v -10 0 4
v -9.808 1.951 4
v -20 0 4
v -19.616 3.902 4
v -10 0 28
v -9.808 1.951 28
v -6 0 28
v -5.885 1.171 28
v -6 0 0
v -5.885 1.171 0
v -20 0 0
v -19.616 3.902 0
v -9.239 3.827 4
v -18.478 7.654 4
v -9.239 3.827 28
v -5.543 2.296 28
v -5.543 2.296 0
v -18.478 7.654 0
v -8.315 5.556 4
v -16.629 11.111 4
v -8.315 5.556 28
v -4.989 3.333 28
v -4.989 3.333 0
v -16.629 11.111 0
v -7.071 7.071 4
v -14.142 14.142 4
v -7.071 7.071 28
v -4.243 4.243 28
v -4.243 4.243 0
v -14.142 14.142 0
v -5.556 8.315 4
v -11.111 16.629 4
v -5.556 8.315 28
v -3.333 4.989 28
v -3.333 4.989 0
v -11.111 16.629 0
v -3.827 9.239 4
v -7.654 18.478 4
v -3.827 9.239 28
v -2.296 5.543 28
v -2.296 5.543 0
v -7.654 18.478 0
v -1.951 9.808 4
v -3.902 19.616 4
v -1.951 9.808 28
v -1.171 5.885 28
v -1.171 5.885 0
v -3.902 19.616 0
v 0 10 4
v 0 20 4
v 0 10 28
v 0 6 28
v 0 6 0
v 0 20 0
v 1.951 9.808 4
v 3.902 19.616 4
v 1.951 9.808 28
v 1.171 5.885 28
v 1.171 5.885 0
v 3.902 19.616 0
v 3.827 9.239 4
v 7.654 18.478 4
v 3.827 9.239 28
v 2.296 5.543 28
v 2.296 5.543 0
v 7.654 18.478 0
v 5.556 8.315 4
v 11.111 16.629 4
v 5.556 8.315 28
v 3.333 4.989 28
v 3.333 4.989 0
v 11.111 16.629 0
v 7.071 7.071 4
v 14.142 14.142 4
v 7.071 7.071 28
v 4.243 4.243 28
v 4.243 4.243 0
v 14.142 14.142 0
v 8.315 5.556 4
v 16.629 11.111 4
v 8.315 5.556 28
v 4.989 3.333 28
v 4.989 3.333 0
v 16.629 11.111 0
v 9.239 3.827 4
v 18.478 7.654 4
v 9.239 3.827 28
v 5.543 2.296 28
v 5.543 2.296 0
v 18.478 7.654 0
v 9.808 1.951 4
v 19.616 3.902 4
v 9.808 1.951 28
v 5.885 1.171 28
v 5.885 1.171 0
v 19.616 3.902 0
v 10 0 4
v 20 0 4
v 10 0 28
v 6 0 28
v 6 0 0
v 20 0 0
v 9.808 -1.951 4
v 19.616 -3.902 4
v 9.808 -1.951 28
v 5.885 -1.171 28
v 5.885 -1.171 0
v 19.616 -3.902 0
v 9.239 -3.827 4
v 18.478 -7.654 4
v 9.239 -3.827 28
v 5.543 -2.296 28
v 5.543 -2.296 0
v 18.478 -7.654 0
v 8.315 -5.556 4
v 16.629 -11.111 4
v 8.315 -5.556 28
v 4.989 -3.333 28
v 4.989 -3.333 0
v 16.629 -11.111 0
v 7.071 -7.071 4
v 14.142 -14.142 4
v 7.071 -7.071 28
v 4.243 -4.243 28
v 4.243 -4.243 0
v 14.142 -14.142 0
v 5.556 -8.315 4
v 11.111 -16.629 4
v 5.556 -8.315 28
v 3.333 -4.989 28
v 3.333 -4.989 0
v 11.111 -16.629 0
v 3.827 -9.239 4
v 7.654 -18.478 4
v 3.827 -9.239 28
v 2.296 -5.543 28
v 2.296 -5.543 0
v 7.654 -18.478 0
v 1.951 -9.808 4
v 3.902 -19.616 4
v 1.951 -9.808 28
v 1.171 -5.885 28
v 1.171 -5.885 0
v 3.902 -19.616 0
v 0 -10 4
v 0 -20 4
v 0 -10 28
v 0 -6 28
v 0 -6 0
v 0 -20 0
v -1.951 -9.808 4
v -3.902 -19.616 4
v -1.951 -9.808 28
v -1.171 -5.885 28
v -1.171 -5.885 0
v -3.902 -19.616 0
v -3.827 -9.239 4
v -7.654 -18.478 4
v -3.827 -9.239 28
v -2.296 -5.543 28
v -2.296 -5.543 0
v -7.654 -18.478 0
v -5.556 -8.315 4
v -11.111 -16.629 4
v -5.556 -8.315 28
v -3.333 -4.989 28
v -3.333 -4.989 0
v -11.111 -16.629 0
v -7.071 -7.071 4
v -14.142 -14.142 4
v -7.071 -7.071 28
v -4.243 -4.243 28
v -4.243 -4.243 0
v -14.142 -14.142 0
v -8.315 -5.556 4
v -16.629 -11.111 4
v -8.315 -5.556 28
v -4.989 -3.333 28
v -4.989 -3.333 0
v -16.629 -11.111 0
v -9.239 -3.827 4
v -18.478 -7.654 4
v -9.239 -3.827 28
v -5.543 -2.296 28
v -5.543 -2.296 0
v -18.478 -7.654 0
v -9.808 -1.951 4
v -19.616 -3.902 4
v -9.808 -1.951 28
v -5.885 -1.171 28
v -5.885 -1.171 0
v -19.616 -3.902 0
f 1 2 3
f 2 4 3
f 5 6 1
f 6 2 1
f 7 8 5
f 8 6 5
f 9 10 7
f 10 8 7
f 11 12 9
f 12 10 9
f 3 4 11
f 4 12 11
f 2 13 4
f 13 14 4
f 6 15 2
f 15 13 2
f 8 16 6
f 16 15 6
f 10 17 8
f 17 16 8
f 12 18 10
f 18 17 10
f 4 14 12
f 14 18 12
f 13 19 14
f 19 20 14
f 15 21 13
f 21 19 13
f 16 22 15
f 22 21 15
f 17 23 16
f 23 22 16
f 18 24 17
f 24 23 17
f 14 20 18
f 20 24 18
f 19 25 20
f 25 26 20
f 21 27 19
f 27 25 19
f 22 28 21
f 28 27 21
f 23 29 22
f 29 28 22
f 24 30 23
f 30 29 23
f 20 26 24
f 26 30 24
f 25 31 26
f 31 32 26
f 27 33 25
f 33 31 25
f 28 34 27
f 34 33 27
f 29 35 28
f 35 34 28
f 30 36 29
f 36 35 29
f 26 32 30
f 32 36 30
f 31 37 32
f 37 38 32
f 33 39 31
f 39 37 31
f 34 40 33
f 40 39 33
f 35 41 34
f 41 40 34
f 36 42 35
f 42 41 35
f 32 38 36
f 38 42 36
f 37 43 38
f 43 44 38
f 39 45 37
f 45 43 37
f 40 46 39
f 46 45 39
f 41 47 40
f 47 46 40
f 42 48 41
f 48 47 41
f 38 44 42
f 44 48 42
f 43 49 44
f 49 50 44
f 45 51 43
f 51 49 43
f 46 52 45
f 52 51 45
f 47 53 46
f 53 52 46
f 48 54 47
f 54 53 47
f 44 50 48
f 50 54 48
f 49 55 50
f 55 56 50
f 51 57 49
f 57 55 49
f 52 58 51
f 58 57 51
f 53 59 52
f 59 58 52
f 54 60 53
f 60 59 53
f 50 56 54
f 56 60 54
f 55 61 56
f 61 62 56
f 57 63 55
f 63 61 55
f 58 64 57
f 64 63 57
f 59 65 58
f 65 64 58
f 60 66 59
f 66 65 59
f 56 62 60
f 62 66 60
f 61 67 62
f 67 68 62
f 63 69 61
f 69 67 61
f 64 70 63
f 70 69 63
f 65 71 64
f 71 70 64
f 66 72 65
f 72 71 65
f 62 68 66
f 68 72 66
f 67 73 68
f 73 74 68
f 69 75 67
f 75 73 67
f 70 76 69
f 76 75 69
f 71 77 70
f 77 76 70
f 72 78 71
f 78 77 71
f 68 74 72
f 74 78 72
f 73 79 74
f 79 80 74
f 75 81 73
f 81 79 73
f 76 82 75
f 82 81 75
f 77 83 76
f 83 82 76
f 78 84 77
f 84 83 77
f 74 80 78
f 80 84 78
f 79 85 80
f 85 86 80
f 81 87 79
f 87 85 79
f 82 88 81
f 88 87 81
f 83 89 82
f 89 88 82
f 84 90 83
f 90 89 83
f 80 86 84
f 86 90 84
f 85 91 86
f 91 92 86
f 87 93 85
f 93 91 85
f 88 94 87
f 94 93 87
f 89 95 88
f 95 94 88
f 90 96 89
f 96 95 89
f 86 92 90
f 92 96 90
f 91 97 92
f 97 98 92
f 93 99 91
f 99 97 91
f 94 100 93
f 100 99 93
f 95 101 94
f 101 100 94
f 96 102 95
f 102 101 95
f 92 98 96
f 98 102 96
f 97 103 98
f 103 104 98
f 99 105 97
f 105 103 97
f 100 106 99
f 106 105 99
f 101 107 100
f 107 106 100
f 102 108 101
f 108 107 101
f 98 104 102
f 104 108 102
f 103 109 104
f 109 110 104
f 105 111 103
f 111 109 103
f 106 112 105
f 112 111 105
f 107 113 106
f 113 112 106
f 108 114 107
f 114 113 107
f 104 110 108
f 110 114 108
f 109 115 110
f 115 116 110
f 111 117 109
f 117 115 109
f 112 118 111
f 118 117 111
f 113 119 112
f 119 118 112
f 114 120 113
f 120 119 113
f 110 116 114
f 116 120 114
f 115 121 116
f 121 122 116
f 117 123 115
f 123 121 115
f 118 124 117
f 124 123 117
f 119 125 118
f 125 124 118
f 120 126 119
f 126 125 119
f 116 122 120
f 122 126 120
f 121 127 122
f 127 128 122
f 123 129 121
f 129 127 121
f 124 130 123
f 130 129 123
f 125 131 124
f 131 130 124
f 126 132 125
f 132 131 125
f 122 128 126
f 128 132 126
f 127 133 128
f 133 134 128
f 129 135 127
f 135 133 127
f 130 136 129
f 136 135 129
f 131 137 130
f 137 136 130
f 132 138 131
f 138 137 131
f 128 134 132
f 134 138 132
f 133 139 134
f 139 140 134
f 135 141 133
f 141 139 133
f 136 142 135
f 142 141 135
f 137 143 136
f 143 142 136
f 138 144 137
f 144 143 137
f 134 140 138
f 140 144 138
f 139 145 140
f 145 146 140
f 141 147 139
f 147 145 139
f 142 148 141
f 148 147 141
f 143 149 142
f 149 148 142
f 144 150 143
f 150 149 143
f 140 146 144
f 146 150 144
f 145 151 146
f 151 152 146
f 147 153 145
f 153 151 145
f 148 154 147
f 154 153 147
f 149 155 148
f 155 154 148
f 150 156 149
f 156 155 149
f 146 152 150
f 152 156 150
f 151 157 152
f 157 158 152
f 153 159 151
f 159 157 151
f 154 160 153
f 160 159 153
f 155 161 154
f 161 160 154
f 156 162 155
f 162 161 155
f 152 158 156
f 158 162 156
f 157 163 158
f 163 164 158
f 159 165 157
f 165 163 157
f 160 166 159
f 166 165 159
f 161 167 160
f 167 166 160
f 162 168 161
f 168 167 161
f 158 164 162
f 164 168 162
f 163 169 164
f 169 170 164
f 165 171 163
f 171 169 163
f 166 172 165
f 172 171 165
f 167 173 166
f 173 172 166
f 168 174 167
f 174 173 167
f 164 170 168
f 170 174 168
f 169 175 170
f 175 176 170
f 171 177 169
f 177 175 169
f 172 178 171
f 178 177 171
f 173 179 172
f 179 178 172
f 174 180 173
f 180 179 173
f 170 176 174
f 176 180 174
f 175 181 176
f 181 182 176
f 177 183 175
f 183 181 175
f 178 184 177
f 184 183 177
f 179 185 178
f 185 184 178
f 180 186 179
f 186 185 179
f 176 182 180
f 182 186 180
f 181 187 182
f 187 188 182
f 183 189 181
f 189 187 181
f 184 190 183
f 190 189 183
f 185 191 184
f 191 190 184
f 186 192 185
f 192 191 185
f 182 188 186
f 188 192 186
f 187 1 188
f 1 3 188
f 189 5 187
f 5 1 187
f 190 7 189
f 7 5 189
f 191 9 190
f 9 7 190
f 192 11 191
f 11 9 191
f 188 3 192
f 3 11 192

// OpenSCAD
$fn = 32;

// ----------------------------------------------------------------------
// Revolved part: flanged bushing R20
// ----------------------------------------------------------------------

// --- parameters (mm) ---
bore_r = 6;               // bore radius
flange_r = 20;            // flange radius
flange_h = 4;             // flange thickness
sleeve_r = 10;            // sleeve radius
total_h = 28;             // overall height
revolve_angle = 360;      // revolve sweep, degrees
fit_tol = 0.1;            // declared fit tolerance (prompt contract)
free_tol = 0.3;           // declared free tolerance (prompt contract)

bore_d = 2 * bore_r;
flange_d = 2 * flange_r;
sleeve_d = 2 * sleeve_r;

profile = [[6, 0], [20, 0], [20, 4], [10, 4], [10, 28], [6, 28]];  // primary outline, 6 points, counter clockwise

// --- the one profile operation ---
rotate_extrude(angle = revolve_angle) polygon(points = profile);
